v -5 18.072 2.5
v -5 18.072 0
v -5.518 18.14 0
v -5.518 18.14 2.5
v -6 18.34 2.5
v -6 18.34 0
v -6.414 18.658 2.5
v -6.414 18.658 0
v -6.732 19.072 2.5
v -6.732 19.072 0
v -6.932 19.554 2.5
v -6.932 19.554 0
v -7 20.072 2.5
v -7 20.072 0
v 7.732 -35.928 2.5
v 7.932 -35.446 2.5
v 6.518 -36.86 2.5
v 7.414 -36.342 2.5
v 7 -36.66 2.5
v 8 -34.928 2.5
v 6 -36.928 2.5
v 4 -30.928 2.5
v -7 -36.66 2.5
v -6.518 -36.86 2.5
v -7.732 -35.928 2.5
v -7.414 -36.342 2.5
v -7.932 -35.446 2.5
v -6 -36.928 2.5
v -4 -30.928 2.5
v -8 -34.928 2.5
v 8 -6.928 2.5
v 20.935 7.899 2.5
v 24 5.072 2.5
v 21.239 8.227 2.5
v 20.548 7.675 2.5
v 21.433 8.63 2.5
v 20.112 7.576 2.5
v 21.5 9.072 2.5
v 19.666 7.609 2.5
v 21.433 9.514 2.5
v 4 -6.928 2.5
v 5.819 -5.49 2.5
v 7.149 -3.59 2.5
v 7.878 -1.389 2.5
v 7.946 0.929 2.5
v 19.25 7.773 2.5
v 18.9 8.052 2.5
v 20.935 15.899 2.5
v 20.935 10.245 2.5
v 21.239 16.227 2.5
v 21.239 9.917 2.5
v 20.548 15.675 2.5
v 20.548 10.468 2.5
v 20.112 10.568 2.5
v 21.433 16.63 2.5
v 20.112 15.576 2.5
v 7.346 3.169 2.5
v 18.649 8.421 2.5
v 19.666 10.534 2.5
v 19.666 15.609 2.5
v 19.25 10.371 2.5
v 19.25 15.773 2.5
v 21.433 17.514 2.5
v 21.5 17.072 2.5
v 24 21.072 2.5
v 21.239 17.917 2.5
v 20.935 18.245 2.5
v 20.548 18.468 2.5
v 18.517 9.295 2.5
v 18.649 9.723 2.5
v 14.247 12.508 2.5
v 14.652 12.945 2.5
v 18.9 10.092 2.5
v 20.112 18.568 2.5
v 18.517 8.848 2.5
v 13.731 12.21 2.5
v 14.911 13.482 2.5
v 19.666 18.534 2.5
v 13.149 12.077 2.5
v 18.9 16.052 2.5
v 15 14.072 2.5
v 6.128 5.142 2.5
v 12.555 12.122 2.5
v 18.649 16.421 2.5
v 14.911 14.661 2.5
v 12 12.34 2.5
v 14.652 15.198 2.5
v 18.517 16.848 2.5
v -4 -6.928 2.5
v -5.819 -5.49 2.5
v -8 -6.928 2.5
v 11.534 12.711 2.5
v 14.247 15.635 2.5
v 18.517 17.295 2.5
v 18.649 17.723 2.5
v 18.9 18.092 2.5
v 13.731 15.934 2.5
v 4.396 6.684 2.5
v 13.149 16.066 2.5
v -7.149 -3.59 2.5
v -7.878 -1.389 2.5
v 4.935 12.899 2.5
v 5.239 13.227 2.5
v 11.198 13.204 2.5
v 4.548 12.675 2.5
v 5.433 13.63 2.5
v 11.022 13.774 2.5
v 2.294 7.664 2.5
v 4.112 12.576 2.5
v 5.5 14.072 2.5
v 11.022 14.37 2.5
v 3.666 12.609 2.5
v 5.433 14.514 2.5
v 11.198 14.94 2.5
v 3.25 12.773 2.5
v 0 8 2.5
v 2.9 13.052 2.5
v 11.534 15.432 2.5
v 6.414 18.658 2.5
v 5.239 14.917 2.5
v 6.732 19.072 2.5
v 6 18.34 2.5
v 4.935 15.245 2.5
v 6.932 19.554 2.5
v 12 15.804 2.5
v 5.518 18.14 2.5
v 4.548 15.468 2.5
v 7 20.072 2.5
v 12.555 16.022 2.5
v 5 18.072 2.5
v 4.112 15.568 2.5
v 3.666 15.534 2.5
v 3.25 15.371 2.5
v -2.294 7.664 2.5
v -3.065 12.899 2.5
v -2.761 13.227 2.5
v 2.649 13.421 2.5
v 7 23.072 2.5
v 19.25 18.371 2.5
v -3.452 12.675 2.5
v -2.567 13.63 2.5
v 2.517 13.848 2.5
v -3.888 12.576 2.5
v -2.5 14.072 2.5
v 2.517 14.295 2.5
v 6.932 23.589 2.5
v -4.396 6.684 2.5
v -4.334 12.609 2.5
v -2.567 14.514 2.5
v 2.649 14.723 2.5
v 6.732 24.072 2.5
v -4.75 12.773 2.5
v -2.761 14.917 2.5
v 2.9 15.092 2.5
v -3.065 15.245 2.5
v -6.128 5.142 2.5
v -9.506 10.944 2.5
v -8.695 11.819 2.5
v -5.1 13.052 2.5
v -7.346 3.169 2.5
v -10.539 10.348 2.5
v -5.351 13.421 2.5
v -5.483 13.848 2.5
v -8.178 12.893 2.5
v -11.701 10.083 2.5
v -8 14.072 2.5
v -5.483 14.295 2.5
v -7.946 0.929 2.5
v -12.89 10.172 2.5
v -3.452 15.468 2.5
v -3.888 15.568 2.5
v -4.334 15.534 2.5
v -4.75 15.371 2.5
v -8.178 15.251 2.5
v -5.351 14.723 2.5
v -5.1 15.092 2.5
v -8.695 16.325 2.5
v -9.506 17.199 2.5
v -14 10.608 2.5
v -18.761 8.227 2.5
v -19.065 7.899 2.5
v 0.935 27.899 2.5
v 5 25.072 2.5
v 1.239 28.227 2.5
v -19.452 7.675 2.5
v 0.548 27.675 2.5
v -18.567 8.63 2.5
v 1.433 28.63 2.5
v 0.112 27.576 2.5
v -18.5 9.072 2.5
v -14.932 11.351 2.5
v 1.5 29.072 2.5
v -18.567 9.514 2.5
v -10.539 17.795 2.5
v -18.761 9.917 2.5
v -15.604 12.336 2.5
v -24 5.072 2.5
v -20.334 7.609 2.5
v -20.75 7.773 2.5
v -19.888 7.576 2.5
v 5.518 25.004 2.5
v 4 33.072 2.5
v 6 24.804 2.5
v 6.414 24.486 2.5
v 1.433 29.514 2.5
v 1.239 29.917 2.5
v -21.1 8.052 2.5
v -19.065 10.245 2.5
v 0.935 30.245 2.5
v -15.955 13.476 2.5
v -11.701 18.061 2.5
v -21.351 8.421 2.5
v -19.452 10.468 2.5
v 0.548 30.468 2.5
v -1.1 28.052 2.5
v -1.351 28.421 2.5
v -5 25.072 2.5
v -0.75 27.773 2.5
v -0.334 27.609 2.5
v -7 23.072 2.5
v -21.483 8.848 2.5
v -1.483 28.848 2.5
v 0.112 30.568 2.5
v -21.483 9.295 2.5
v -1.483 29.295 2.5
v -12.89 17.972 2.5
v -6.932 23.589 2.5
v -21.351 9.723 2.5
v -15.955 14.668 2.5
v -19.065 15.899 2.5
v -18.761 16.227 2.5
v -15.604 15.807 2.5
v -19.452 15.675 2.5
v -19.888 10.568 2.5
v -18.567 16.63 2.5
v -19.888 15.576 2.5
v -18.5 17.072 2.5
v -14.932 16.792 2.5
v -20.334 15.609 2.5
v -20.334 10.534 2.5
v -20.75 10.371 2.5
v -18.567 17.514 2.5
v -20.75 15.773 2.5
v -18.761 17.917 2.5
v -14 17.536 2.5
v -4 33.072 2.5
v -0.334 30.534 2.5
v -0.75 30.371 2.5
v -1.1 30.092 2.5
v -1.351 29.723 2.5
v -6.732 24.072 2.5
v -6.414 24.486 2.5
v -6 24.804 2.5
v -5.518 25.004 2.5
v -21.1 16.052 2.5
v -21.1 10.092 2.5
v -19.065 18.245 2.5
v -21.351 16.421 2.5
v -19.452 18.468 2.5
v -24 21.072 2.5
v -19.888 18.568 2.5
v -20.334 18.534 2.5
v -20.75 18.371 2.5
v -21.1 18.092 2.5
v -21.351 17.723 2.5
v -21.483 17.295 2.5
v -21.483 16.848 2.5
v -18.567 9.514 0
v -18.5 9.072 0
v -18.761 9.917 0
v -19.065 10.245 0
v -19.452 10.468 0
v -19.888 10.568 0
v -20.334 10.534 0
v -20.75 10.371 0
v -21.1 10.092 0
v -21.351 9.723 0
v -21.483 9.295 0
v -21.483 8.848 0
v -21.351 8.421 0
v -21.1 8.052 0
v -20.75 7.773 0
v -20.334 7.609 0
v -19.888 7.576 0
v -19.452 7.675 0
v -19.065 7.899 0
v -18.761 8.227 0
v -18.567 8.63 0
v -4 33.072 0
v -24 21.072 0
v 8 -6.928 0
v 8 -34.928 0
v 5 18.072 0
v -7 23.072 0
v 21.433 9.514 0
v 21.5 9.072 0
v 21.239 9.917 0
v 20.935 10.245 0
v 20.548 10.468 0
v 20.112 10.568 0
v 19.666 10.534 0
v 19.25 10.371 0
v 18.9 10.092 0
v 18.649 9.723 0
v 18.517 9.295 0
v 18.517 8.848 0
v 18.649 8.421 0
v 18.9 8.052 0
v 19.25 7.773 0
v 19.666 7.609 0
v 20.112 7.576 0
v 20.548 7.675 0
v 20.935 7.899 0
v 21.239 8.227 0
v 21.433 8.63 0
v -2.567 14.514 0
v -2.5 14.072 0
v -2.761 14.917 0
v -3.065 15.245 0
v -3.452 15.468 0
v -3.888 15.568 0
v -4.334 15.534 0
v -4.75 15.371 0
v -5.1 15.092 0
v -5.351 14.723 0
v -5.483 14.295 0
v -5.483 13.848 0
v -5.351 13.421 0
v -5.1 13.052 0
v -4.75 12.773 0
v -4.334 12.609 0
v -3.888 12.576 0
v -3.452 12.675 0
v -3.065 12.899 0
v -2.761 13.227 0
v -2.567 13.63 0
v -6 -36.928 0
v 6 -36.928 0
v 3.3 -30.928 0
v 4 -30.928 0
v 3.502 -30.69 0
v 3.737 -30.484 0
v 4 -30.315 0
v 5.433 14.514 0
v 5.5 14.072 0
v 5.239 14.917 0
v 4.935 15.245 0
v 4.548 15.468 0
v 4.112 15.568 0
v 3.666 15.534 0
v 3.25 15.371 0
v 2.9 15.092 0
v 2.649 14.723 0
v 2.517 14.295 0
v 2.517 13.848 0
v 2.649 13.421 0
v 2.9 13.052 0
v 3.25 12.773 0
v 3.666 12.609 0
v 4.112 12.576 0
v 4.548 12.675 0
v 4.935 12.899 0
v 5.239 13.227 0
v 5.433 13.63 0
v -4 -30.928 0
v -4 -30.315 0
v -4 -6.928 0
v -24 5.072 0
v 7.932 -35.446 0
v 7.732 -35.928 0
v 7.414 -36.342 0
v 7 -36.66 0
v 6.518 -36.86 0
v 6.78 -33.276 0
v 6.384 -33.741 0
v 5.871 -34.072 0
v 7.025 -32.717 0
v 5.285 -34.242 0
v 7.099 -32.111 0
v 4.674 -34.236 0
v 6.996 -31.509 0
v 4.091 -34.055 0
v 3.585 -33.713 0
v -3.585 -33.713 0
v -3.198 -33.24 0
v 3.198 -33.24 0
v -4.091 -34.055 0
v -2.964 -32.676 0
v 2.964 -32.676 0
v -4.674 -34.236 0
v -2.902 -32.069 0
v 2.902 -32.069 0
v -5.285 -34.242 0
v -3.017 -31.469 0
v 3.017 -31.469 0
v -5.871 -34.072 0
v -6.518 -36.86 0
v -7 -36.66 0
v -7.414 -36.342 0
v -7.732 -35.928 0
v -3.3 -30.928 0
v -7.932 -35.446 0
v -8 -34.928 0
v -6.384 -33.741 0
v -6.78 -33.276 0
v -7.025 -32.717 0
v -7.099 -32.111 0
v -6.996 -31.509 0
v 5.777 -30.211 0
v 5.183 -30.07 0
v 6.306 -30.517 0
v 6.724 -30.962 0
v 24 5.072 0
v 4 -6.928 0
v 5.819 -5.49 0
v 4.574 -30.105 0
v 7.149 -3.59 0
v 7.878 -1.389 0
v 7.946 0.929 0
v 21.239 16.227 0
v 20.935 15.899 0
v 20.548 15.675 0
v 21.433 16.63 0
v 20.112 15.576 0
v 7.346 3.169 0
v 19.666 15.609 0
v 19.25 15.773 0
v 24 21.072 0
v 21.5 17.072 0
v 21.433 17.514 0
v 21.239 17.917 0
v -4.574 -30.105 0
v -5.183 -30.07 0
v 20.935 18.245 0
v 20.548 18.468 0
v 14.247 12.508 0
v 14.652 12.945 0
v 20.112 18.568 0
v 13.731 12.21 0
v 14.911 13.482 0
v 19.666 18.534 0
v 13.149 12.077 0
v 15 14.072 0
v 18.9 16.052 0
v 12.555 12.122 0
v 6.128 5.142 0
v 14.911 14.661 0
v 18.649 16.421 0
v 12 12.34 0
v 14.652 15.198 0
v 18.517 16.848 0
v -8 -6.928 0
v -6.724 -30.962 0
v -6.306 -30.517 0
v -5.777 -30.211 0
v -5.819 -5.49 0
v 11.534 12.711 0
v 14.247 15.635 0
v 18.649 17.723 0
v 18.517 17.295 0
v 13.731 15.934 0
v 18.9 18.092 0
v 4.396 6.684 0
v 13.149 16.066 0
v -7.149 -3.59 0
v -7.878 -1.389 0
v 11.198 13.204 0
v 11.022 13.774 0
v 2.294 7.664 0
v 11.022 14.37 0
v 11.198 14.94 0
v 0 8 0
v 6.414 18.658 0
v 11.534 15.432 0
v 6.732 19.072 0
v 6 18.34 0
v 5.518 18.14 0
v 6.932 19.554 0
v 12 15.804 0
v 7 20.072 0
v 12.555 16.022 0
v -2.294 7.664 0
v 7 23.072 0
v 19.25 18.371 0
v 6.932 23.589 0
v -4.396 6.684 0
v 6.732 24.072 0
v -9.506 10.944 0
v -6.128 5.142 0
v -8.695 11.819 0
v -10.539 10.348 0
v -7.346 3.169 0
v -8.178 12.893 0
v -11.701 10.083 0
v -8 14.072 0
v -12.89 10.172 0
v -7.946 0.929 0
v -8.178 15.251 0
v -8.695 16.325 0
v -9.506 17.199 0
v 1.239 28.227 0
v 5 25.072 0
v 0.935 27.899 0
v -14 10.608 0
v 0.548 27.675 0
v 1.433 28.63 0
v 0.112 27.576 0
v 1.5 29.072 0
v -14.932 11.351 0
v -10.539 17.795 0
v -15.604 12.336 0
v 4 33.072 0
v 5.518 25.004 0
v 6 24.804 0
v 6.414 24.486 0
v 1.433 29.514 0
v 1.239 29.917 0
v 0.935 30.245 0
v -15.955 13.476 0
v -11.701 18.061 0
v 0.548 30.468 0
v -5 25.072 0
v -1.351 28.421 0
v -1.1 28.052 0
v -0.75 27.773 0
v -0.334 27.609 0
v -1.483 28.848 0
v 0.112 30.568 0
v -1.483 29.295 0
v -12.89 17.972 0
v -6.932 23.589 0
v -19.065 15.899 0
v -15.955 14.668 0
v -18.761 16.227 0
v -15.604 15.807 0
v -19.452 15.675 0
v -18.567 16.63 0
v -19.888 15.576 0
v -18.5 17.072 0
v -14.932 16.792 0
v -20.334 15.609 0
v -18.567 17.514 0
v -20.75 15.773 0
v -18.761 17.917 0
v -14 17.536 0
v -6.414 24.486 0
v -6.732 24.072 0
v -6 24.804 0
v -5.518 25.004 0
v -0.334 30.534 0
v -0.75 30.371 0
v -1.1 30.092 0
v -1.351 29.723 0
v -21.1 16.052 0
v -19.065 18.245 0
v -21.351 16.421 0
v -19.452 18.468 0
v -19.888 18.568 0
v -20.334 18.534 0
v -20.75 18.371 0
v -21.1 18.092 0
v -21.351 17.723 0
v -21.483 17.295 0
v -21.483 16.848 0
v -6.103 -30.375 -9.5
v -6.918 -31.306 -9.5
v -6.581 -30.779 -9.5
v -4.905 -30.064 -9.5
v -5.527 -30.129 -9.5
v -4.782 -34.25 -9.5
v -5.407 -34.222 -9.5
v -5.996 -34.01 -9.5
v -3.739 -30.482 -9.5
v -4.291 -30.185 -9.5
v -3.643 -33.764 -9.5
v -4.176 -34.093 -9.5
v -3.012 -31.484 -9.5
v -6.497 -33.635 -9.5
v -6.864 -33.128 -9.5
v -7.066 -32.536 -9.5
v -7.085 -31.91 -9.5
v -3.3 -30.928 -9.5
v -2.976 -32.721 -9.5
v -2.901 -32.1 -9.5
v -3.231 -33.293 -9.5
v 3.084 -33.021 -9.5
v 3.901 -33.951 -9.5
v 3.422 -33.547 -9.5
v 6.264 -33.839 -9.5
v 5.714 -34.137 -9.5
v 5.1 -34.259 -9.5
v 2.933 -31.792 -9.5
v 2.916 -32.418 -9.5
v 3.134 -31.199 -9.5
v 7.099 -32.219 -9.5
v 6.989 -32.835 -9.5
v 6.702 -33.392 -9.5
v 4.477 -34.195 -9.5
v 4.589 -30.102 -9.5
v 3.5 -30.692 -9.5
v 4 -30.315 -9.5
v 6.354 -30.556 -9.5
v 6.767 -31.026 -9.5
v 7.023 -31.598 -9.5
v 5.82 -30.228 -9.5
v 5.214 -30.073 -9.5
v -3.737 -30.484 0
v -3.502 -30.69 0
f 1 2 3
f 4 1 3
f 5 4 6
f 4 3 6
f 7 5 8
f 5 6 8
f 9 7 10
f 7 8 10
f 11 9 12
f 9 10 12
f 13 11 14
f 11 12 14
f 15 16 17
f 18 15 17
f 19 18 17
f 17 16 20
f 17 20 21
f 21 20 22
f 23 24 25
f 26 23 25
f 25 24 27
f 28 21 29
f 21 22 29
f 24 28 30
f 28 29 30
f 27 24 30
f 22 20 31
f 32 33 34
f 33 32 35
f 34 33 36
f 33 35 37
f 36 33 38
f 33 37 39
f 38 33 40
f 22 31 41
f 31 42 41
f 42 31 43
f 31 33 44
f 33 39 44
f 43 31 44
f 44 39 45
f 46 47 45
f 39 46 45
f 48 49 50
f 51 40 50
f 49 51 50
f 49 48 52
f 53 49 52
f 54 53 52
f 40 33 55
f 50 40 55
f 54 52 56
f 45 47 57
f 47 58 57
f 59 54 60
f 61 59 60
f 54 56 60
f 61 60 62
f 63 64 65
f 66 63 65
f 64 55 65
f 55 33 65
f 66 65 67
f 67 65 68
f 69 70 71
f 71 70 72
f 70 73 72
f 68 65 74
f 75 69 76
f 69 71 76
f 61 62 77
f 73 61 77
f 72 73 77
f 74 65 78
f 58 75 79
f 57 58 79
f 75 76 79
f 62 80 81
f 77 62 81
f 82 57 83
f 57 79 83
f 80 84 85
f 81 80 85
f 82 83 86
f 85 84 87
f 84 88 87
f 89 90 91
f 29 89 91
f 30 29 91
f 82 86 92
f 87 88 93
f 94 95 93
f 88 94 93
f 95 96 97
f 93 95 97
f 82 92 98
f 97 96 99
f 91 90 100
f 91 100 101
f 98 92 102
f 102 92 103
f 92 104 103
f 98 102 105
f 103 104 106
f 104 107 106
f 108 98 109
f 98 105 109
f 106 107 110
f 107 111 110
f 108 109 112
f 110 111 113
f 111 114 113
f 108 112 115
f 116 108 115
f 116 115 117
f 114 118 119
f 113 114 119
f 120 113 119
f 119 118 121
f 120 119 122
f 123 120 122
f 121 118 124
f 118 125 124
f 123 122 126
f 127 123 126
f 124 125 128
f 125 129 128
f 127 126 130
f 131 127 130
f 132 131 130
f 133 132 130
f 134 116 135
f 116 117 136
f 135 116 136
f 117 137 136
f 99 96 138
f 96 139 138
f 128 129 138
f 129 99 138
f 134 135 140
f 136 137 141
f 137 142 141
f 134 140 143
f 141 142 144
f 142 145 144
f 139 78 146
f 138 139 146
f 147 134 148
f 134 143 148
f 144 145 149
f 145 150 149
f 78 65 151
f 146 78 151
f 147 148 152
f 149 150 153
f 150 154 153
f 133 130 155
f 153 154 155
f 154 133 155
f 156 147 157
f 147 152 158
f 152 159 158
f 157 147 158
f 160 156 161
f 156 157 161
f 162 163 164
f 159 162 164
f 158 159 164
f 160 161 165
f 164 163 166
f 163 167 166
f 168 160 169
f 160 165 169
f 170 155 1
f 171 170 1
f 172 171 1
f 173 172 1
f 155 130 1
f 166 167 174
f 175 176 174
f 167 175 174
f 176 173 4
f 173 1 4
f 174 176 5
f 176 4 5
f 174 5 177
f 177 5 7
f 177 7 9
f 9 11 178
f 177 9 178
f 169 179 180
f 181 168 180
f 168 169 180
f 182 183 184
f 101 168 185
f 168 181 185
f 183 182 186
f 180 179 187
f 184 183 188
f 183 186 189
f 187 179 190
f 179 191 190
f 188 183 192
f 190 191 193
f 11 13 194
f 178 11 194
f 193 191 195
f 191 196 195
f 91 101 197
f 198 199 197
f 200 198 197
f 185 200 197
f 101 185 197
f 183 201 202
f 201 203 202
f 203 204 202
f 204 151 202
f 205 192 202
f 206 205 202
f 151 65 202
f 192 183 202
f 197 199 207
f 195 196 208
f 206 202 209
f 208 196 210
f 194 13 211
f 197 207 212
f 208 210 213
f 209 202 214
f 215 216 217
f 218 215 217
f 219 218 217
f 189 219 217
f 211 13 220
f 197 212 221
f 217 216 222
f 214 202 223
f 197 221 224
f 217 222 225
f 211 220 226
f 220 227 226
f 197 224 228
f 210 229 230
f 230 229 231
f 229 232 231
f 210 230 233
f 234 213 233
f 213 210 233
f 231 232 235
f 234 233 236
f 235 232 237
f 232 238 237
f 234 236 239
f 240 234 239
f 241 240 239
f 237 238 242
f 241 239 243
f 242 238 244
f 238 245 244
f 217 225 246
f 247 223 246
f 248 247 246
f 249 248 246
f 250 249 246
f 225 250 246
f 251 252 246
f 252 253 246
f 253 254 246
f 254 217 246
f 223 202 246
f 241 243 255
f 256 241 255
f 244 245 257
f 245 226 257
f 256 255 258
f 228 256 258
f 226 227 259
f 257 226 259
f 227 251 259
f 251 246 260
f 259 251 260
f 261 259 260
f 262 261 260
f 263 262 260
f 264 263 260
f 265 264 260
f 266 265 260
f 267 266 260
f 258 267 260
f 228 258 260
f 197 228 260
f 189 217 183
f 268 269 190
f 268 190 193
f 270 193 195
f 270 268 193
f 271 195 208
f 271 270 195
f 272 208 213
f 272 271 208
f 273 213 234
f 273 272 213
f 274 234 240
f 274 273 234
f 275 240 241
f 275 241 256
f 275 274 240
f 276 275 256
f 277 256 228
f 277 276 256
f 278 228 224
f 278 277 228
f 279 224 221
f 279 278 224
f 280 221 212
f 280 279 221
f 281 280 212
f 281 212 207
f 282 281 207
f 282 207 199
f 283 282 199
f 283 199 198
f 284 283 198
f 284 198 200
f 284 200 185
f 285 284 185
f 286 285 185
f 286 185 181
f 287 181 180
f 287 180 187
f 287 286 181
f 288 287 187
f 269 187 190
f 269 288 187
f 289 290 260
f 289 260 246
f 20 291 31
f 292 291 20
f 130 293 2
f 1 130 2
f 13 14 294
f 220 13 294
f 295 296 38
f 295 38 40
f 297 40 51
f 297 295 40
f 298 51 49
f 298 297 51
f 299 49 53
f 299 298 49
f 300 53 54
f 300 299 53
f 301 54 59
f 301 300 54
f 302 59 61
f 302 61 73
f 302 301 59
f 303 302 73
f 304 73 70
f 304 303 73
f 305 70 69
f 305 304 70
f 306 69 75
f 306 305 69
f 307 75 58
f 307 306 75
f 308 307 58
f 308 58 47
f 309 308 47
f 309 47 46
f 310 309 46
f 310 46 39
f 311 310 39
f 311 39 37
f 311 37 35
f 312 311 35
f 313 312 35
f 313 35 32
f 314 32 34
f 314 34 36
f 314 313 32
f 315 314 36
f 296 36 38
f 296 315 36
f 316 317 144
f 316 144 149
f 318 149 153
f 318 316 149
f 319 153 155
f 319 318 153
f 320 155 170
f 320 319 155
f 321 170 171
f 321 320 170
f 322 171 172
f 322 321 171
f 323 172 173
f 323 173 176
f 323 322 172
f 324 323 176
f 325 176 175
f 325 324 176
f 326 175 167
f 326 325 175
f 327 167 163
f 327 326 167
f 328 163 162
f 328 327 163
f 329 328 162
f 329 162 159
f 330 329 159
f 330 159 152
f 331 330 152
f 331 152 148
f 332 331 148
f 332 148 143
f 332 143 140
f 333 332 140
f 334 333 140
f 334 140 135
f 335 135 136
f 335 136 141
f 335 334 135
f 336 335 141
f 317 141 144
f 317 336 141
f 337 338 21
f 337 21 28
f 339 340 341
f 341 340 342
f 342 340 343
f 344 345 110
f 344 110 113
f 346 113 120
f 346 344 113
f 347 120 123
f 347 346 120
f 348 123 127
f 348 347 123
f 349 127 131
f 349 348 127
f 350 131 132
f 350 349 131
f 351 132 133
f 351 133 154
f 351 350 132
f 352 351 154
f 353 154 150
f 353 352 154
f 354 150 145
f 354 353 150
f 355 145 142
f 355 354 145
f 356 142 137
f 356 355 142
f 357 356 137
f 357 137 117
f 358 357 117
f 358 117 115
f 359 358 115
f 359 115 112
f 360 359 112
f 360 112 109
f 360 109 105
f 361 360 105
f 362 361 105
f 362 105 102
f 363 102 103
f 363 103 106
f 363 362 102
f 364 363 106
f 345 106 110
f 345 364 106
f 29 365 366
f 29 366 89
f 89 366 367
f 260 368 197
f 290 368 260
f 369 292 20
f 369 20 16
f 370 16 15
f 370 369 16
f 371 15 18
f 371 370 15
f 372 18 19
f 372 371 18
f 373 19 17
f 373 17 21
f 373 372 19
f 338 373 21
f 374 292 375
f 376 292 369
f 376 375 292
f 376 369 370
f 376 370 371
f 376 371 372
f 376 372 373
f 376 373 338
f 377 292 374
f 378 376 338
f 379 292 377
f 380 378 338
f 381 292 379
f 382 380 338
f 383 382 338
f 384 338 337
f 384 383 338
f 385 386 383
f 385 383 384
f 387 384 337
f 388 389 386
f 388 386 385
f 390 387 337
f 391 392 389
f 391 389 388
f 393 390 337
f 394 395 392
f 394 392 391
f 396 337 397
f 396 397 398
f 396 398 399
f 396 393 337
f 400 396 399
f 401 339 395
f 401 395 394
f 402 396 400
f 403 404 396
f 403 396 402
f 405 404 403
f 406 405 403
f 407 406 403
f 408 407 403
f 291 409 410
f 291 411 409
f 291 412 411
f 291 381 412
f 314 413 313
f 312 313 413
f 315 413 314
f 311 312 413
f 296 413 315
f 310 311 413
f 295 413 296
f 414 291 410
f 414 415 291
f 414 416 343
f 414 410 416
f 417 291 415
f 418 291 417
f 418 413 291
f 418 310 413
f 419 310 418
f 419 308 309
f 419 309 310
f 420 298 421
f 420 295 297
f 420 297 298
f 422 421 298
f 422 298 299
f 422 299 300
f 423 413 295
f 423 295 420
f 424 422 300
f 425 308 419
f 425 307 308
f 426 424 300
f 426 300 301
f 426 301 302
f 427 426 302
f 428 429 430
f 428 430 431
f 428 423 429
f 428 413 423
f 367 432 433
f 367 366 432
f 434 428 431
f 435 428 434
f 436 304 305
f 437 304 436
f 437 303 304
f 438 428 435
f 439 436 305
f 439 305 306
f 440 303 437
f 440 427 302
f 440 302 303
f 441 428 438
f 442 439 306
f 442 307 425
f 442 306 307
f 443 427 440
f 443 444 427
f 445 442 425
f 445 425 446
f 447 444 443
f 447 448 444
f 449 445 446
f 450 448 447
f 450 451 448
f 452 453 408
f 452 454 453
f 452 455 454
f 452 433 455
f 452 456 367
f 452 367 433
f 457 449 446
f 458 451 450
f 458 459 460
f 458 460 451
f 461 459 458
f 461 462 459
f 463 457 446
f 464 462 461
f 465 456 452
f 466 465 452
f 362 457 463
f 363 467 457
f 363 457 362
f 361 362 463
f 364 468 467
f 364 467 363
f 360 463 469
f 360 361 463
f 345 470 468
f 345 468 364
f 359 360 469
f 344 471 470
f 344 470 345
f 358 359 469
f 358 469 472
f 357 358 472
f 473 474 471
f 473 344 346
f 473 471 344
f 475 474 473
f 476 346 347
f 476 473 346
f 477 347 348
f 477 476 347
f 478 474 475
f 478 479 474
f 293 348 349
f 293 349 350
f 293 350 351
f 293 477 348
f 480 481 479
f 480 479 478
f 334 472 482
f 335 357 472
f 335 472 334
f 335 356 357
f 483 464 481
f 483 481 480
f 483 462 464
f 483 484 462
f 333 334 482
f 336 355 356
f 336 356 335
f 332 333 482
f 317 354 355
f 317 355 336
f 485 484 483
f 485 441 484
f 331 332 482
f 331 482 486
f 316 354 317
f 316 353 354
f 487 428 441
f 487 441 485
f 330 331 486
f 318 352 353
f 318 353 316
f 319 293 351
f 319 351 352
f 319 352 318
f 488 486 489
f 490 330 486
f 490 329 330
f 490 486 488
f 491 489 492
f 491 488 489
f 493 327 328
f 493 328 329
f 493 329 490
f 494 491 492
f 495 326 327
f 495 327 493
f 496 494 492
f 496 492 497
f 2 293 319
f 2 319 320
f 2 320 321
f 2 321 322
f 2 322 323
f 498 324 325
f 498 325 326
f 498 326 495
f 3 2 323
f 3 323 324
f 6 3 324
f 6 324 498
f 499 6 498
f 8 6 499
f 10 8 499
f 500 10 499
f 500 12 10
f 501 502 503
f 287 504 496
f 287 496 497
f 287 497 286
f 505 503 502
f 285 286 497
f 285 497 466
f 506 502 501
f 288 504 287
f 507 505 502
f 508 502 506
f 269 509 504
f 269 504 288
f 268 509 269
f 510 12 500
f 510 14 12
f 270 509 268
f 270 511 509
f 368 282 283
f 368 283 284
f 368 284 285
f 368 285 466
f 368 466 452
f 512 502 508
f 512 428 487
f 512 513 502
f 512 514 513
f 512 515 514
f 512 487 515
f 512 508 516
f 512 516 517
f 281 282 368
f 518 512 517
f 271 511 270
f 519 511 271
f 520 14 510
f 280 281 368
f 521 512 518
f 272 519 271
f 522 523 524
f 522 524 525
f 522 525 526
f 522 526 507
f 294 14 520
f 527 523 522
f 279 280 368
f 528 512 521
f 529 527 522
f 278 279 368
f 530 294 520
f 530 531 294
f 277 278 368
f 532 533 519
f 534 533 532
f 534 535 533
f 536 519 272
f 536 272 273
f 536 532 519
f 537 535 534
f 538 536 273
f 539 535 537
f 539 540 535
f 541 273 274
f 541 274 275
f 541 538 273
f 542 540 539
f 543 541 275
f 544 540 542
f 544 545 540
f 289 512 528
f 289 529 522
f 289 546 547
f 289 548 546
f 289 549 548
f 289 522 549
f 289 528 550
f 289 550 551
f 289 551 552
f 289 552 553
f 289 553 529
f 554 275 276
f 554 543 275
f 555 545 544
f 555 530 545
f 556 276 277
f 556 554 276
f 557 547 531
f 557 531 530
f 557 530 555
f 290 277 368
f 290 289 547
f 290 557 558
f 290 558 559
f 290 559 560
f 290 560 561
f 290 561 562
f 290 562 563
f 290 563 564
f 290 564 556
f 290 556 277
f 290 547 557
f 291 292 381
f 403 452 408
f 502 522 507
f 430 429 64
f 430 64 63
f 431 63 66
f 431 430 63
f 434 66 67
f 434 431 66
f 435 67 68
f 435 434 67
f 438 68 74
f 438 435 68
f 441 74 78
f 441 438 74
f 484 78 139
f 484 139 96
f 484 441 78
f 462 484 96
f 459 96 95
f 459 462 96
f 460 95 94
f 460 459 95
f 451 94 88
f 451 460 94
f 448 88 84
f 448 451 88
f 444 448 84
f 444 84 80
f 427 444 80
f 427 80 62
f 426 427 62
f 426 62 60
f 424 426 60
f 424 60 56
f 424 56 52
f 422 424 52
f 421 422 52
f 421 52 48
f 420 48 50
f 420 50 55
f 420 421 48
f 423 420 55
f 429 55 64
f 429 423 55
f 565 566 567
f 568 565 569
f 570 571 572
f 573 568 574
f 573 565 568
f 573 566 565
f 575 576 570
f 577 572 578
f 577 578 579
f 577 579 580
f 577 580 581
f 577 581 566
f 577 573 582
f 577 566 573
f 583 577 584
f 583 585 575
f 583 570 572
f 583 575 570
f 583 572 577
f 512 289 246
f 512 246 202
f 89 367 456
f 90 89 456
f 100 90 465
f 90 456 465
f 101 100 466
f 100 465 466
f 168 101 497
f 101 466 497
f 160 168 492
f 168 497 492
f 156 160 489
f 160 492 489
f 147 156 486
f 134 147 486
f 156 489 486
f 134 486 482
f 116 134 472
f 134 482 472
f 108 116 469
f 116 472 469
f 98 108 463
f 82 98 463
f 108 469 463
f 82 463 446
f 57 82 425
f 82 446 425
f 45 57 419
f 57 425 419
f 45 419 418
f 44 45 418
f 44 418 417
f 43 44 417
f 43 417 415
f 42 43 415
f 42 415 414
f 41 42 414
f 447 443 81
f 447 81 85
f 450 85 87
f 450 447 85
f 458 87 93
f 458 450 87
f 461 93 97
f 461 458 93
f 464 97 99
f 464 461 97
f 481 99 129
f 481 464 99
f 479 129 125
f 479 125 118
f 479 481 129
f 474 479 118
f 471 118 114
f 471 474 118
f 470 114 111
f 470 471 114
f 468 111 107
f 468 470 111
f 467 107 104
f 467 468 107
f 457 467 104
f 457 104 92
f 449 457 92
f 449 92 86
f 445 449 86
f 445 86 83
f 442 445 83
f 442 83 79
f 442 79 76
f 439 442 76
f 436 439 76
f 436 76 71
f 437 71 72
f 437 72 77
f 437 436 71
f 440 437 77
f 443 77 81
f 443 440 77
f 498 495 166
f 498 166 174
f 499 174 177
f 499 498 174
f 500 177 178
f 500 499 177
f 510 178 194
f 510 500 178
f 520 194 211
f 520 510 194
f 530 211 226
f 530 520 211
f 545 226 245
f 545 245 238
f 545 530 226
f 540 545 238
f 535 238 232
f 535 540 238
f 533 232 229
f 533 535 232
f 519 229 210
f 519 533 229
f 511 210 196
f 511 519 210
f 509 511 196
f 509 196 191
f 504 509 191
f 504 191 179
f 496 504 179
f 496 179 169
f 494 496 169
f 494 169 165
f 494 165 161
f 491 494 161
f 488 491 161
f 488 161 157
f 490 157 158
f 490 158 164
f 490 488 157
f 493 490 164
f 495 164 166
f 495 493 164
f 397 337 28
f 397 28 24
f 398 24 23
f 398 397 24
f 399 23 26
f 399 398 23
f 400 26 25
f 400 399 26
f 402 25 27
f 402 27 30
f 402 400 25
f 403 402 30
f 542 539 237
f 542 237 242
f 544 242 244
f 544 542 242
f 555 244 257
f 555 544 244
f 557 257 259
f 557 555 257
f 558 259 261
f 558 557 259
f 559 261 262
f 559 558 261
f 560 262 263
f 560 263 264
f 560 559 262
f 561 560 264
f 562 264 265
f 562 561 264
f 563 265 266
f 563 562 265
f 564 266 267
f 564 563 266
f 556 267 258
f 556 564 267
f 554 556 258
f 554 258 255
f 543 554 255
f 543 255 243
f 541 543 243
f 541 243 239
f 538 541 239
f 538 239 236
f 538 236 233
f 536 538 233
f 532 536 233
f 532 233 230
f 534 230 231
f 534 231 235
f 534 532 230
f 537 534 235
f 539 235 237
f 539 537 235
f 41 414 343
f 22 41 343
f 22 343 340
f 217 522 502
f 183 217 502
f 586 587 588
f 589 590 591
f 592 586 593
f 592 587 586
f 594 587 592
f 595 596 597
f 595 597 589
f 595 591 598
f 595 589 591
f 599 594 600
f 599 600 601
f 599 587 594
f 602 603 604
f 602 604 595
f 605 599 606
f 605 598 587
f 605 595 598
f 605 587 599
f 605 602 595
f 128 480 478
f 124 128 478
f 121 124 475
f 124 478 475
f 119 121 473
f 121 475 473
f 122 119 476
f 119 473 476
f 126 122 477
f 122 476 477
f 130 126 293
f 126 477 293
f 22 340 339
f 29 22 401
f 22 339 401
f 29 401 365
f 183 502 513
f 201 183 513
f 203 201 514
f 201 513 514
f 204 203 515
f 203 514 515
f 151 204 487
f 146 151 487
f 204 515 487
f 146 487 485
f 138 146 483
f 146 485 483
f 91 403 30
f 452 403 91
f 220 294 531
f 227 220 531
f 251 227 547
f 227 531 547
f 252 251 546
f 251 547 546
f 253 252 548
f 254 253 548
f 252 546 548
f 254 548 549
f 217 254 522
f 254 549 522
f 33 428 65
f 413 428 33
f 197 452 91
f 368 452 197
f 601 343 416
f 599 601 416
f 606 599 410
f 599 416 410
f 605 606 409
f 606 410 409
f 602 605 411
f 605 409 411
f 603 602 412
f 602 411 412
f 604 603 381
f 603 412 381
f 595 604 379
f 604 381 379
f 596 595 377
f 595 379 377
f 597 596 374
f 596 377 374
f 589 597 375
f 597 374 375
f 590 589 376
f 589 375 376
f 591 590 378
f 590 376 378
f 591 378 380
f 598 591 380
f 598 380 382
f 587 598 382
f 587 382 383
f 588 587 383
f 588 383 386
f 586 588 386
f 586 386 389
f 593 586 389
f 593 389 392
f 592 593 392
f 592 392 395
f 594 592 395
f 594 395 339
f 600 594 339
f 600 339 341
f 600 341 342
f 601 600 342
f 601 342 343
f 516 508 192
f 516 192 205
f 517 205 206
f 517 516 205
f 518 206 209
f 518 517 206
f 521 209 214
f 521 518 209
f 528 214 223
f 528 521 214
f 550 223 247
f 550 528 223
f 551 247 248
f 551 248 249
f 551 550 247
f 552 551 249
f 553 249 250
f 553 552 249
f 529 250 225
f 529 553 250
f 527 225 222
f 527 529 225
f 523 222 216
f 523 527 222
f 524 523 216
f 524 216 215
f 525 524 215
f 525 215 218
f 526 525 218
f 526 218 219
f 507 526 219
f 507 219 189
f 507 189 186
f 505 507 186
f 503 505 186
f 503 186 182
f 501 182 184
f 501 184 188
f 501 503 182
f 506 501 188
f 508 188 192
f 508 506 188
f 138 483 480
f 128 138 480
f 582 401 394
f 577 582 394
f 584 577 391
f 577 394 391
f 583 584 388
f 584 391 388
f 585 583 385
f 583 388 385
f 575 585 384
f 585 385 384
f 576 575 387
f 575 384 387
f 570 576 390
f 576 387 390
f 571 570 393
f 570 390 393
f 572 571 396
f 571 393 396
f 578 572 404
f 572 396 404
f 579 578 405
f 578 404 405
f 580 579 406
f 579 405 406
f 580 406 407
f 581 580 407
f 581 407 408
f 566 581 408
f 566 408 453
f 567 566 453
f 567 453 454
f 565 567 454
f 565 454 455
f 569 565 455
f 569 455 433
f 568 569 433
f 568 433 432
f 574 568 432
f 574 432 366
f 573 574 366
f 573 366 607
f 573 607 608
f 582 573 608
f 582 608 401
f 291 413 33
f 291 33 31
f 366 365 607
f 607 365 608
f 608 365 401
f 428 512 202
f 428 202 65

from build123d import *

# Parameters (mm, degrees)
SKETCH1_R           = 4
SKETCH1_R_2         = 1.5
SKETCH1_R_3         = 2
BOSS_EXTRUDE1_DEPTH = 2.5
SKETCH2_R           = 2.1
BOSS_EXTRUDE2_DEPTH = 9.5


with BuildPart() as part:
    # Sketch1 → Boss-Extrude1 (new body)
    with BuildSketch(Plane.XY):
        with BuildLine():
            Line((-24, 5.07179677), (-24, 21.07179677))
            Line((-24, 21.07179677), (-4, 33.07179677))
            Line((-4, 33.07179677), (4, 33.07179677))
            Line((4, 33.07179677), (24, 21.07179677))
            Line((24, 21.07179677), (24, 5.07179677))
            Line((24, 5.07179677), (8, -6.92820323))
            Line((8, -6.92820323), (8, -34.92820323))
            ThreePointArc((8, -34.92820323), (7.414213562, -36.342416793), (6, -36.92820323))
            Line((6, -36.92820323), (-6, -36.92820323))
            ThreePointArc((-6, -36.92820323), (-7.414213562, -36.342416793), (-8, -34.92820323))
            Line((-8, -34.92820323), (-8, -6.92820323))
            Line((-8, -6.92820323), (-24, 5.07179677))
        make_face()
        with Locations((-12, 14.07179677)):
            Circle(SKETCH1_R, mode=Mode.SUBTRACT)
        with Locations((-4, 14.07179677)):
            Circle(SKETCH1_R_2, mode=Mode.SUBTRACT)
        with Locations((4, 14.07179677)):
            Circle(SKETCH1_R_2, mode=Mode.SUBTRACT)
        with Locations((0, 29.07179677)):
            Circle(SKETCH1_R_2, mode=Mode.SUBTRACT)
        with Locations((20, 17.07179677)):
            Circle(SKETCH1_R_2, mode=Mode.SUBTRACT)
        with Locations((20, 9.07179677)):
            Circle(SKETCH1_R_2, mode=Mode.SUBTRACT)
        with Locations((-20, 17.07179677)):
            Circle(SKETCH1_R_2, mode=Mode.SUBTRACT)
        with Locations((-20, 9.07179677)):
            Circle(SKETCH1_R_2, mode=Mode.SUBTRACT)
        with Locations((13, 14.07179677)):
            Circle(SKETCH1_R_3, mode=Mode.SUBTRACT)
        with BuildLine():
            Line((4, -30.92820323), (-4, -30.92820323))
            Line((-4, -30.92820323), (-4, -6.92820323))
            ThreePointArc((-4, -6.92820323), (0, 8), (4, -6.92820323))
            Line((4, -6.92820323), (4, -30.92820323))
        make_face(mode=Mode.SUBTRACT)
        with BuildLine():
            Line((-5, 25.07179677), (5, 25.07179677))
            ThreePointArc((5, 25.07179677), (6.414213562, 24.486010332), (7, 23.07179677))
            Line((7, 23.07179677), (7, 20.07179677))
            ThreePointArc((7, 20.07179677), (6.414213562, 18.657583207), (5, 18.07179677))
            Line((5, 18.07179677), (-5, 18.07179677))
            ThreePointArc((-5, 18.07179677), (-6.414213562, 18.657583207), (-7, 20.07179677))
            Line((-7, 20.07179677), (-7, 23.07179677))
            ThreePointArc((-7, 23.07179677), (-6.414213562, 24.486010332), (-5, 25.07179677))
        make_face(mode=Mode.SUBTRACT)
    extrude(amount=BOSS_EXTRUDE1_DEPTH)

    # Sketch2 → Boss-Extrude2 (add)
    with BuildSketch(Plane(origin=(0, 0, 0), x_dir=(-1, 0, 0), z_dir=(0, 0, -1))):
        with Locations(Location((-5, -32.16164975, 0), (0, 0, 61.563109851))):
            Circle(SKETCH2_R)
        with Locations(Location((5, -32.16164975, 0), (0, 0, 144.030430851))):
            Circle(SKETCH2_R)
    extrude(amount=BOSS_EXTRUDE2_DEPTH)


solid = part.part
